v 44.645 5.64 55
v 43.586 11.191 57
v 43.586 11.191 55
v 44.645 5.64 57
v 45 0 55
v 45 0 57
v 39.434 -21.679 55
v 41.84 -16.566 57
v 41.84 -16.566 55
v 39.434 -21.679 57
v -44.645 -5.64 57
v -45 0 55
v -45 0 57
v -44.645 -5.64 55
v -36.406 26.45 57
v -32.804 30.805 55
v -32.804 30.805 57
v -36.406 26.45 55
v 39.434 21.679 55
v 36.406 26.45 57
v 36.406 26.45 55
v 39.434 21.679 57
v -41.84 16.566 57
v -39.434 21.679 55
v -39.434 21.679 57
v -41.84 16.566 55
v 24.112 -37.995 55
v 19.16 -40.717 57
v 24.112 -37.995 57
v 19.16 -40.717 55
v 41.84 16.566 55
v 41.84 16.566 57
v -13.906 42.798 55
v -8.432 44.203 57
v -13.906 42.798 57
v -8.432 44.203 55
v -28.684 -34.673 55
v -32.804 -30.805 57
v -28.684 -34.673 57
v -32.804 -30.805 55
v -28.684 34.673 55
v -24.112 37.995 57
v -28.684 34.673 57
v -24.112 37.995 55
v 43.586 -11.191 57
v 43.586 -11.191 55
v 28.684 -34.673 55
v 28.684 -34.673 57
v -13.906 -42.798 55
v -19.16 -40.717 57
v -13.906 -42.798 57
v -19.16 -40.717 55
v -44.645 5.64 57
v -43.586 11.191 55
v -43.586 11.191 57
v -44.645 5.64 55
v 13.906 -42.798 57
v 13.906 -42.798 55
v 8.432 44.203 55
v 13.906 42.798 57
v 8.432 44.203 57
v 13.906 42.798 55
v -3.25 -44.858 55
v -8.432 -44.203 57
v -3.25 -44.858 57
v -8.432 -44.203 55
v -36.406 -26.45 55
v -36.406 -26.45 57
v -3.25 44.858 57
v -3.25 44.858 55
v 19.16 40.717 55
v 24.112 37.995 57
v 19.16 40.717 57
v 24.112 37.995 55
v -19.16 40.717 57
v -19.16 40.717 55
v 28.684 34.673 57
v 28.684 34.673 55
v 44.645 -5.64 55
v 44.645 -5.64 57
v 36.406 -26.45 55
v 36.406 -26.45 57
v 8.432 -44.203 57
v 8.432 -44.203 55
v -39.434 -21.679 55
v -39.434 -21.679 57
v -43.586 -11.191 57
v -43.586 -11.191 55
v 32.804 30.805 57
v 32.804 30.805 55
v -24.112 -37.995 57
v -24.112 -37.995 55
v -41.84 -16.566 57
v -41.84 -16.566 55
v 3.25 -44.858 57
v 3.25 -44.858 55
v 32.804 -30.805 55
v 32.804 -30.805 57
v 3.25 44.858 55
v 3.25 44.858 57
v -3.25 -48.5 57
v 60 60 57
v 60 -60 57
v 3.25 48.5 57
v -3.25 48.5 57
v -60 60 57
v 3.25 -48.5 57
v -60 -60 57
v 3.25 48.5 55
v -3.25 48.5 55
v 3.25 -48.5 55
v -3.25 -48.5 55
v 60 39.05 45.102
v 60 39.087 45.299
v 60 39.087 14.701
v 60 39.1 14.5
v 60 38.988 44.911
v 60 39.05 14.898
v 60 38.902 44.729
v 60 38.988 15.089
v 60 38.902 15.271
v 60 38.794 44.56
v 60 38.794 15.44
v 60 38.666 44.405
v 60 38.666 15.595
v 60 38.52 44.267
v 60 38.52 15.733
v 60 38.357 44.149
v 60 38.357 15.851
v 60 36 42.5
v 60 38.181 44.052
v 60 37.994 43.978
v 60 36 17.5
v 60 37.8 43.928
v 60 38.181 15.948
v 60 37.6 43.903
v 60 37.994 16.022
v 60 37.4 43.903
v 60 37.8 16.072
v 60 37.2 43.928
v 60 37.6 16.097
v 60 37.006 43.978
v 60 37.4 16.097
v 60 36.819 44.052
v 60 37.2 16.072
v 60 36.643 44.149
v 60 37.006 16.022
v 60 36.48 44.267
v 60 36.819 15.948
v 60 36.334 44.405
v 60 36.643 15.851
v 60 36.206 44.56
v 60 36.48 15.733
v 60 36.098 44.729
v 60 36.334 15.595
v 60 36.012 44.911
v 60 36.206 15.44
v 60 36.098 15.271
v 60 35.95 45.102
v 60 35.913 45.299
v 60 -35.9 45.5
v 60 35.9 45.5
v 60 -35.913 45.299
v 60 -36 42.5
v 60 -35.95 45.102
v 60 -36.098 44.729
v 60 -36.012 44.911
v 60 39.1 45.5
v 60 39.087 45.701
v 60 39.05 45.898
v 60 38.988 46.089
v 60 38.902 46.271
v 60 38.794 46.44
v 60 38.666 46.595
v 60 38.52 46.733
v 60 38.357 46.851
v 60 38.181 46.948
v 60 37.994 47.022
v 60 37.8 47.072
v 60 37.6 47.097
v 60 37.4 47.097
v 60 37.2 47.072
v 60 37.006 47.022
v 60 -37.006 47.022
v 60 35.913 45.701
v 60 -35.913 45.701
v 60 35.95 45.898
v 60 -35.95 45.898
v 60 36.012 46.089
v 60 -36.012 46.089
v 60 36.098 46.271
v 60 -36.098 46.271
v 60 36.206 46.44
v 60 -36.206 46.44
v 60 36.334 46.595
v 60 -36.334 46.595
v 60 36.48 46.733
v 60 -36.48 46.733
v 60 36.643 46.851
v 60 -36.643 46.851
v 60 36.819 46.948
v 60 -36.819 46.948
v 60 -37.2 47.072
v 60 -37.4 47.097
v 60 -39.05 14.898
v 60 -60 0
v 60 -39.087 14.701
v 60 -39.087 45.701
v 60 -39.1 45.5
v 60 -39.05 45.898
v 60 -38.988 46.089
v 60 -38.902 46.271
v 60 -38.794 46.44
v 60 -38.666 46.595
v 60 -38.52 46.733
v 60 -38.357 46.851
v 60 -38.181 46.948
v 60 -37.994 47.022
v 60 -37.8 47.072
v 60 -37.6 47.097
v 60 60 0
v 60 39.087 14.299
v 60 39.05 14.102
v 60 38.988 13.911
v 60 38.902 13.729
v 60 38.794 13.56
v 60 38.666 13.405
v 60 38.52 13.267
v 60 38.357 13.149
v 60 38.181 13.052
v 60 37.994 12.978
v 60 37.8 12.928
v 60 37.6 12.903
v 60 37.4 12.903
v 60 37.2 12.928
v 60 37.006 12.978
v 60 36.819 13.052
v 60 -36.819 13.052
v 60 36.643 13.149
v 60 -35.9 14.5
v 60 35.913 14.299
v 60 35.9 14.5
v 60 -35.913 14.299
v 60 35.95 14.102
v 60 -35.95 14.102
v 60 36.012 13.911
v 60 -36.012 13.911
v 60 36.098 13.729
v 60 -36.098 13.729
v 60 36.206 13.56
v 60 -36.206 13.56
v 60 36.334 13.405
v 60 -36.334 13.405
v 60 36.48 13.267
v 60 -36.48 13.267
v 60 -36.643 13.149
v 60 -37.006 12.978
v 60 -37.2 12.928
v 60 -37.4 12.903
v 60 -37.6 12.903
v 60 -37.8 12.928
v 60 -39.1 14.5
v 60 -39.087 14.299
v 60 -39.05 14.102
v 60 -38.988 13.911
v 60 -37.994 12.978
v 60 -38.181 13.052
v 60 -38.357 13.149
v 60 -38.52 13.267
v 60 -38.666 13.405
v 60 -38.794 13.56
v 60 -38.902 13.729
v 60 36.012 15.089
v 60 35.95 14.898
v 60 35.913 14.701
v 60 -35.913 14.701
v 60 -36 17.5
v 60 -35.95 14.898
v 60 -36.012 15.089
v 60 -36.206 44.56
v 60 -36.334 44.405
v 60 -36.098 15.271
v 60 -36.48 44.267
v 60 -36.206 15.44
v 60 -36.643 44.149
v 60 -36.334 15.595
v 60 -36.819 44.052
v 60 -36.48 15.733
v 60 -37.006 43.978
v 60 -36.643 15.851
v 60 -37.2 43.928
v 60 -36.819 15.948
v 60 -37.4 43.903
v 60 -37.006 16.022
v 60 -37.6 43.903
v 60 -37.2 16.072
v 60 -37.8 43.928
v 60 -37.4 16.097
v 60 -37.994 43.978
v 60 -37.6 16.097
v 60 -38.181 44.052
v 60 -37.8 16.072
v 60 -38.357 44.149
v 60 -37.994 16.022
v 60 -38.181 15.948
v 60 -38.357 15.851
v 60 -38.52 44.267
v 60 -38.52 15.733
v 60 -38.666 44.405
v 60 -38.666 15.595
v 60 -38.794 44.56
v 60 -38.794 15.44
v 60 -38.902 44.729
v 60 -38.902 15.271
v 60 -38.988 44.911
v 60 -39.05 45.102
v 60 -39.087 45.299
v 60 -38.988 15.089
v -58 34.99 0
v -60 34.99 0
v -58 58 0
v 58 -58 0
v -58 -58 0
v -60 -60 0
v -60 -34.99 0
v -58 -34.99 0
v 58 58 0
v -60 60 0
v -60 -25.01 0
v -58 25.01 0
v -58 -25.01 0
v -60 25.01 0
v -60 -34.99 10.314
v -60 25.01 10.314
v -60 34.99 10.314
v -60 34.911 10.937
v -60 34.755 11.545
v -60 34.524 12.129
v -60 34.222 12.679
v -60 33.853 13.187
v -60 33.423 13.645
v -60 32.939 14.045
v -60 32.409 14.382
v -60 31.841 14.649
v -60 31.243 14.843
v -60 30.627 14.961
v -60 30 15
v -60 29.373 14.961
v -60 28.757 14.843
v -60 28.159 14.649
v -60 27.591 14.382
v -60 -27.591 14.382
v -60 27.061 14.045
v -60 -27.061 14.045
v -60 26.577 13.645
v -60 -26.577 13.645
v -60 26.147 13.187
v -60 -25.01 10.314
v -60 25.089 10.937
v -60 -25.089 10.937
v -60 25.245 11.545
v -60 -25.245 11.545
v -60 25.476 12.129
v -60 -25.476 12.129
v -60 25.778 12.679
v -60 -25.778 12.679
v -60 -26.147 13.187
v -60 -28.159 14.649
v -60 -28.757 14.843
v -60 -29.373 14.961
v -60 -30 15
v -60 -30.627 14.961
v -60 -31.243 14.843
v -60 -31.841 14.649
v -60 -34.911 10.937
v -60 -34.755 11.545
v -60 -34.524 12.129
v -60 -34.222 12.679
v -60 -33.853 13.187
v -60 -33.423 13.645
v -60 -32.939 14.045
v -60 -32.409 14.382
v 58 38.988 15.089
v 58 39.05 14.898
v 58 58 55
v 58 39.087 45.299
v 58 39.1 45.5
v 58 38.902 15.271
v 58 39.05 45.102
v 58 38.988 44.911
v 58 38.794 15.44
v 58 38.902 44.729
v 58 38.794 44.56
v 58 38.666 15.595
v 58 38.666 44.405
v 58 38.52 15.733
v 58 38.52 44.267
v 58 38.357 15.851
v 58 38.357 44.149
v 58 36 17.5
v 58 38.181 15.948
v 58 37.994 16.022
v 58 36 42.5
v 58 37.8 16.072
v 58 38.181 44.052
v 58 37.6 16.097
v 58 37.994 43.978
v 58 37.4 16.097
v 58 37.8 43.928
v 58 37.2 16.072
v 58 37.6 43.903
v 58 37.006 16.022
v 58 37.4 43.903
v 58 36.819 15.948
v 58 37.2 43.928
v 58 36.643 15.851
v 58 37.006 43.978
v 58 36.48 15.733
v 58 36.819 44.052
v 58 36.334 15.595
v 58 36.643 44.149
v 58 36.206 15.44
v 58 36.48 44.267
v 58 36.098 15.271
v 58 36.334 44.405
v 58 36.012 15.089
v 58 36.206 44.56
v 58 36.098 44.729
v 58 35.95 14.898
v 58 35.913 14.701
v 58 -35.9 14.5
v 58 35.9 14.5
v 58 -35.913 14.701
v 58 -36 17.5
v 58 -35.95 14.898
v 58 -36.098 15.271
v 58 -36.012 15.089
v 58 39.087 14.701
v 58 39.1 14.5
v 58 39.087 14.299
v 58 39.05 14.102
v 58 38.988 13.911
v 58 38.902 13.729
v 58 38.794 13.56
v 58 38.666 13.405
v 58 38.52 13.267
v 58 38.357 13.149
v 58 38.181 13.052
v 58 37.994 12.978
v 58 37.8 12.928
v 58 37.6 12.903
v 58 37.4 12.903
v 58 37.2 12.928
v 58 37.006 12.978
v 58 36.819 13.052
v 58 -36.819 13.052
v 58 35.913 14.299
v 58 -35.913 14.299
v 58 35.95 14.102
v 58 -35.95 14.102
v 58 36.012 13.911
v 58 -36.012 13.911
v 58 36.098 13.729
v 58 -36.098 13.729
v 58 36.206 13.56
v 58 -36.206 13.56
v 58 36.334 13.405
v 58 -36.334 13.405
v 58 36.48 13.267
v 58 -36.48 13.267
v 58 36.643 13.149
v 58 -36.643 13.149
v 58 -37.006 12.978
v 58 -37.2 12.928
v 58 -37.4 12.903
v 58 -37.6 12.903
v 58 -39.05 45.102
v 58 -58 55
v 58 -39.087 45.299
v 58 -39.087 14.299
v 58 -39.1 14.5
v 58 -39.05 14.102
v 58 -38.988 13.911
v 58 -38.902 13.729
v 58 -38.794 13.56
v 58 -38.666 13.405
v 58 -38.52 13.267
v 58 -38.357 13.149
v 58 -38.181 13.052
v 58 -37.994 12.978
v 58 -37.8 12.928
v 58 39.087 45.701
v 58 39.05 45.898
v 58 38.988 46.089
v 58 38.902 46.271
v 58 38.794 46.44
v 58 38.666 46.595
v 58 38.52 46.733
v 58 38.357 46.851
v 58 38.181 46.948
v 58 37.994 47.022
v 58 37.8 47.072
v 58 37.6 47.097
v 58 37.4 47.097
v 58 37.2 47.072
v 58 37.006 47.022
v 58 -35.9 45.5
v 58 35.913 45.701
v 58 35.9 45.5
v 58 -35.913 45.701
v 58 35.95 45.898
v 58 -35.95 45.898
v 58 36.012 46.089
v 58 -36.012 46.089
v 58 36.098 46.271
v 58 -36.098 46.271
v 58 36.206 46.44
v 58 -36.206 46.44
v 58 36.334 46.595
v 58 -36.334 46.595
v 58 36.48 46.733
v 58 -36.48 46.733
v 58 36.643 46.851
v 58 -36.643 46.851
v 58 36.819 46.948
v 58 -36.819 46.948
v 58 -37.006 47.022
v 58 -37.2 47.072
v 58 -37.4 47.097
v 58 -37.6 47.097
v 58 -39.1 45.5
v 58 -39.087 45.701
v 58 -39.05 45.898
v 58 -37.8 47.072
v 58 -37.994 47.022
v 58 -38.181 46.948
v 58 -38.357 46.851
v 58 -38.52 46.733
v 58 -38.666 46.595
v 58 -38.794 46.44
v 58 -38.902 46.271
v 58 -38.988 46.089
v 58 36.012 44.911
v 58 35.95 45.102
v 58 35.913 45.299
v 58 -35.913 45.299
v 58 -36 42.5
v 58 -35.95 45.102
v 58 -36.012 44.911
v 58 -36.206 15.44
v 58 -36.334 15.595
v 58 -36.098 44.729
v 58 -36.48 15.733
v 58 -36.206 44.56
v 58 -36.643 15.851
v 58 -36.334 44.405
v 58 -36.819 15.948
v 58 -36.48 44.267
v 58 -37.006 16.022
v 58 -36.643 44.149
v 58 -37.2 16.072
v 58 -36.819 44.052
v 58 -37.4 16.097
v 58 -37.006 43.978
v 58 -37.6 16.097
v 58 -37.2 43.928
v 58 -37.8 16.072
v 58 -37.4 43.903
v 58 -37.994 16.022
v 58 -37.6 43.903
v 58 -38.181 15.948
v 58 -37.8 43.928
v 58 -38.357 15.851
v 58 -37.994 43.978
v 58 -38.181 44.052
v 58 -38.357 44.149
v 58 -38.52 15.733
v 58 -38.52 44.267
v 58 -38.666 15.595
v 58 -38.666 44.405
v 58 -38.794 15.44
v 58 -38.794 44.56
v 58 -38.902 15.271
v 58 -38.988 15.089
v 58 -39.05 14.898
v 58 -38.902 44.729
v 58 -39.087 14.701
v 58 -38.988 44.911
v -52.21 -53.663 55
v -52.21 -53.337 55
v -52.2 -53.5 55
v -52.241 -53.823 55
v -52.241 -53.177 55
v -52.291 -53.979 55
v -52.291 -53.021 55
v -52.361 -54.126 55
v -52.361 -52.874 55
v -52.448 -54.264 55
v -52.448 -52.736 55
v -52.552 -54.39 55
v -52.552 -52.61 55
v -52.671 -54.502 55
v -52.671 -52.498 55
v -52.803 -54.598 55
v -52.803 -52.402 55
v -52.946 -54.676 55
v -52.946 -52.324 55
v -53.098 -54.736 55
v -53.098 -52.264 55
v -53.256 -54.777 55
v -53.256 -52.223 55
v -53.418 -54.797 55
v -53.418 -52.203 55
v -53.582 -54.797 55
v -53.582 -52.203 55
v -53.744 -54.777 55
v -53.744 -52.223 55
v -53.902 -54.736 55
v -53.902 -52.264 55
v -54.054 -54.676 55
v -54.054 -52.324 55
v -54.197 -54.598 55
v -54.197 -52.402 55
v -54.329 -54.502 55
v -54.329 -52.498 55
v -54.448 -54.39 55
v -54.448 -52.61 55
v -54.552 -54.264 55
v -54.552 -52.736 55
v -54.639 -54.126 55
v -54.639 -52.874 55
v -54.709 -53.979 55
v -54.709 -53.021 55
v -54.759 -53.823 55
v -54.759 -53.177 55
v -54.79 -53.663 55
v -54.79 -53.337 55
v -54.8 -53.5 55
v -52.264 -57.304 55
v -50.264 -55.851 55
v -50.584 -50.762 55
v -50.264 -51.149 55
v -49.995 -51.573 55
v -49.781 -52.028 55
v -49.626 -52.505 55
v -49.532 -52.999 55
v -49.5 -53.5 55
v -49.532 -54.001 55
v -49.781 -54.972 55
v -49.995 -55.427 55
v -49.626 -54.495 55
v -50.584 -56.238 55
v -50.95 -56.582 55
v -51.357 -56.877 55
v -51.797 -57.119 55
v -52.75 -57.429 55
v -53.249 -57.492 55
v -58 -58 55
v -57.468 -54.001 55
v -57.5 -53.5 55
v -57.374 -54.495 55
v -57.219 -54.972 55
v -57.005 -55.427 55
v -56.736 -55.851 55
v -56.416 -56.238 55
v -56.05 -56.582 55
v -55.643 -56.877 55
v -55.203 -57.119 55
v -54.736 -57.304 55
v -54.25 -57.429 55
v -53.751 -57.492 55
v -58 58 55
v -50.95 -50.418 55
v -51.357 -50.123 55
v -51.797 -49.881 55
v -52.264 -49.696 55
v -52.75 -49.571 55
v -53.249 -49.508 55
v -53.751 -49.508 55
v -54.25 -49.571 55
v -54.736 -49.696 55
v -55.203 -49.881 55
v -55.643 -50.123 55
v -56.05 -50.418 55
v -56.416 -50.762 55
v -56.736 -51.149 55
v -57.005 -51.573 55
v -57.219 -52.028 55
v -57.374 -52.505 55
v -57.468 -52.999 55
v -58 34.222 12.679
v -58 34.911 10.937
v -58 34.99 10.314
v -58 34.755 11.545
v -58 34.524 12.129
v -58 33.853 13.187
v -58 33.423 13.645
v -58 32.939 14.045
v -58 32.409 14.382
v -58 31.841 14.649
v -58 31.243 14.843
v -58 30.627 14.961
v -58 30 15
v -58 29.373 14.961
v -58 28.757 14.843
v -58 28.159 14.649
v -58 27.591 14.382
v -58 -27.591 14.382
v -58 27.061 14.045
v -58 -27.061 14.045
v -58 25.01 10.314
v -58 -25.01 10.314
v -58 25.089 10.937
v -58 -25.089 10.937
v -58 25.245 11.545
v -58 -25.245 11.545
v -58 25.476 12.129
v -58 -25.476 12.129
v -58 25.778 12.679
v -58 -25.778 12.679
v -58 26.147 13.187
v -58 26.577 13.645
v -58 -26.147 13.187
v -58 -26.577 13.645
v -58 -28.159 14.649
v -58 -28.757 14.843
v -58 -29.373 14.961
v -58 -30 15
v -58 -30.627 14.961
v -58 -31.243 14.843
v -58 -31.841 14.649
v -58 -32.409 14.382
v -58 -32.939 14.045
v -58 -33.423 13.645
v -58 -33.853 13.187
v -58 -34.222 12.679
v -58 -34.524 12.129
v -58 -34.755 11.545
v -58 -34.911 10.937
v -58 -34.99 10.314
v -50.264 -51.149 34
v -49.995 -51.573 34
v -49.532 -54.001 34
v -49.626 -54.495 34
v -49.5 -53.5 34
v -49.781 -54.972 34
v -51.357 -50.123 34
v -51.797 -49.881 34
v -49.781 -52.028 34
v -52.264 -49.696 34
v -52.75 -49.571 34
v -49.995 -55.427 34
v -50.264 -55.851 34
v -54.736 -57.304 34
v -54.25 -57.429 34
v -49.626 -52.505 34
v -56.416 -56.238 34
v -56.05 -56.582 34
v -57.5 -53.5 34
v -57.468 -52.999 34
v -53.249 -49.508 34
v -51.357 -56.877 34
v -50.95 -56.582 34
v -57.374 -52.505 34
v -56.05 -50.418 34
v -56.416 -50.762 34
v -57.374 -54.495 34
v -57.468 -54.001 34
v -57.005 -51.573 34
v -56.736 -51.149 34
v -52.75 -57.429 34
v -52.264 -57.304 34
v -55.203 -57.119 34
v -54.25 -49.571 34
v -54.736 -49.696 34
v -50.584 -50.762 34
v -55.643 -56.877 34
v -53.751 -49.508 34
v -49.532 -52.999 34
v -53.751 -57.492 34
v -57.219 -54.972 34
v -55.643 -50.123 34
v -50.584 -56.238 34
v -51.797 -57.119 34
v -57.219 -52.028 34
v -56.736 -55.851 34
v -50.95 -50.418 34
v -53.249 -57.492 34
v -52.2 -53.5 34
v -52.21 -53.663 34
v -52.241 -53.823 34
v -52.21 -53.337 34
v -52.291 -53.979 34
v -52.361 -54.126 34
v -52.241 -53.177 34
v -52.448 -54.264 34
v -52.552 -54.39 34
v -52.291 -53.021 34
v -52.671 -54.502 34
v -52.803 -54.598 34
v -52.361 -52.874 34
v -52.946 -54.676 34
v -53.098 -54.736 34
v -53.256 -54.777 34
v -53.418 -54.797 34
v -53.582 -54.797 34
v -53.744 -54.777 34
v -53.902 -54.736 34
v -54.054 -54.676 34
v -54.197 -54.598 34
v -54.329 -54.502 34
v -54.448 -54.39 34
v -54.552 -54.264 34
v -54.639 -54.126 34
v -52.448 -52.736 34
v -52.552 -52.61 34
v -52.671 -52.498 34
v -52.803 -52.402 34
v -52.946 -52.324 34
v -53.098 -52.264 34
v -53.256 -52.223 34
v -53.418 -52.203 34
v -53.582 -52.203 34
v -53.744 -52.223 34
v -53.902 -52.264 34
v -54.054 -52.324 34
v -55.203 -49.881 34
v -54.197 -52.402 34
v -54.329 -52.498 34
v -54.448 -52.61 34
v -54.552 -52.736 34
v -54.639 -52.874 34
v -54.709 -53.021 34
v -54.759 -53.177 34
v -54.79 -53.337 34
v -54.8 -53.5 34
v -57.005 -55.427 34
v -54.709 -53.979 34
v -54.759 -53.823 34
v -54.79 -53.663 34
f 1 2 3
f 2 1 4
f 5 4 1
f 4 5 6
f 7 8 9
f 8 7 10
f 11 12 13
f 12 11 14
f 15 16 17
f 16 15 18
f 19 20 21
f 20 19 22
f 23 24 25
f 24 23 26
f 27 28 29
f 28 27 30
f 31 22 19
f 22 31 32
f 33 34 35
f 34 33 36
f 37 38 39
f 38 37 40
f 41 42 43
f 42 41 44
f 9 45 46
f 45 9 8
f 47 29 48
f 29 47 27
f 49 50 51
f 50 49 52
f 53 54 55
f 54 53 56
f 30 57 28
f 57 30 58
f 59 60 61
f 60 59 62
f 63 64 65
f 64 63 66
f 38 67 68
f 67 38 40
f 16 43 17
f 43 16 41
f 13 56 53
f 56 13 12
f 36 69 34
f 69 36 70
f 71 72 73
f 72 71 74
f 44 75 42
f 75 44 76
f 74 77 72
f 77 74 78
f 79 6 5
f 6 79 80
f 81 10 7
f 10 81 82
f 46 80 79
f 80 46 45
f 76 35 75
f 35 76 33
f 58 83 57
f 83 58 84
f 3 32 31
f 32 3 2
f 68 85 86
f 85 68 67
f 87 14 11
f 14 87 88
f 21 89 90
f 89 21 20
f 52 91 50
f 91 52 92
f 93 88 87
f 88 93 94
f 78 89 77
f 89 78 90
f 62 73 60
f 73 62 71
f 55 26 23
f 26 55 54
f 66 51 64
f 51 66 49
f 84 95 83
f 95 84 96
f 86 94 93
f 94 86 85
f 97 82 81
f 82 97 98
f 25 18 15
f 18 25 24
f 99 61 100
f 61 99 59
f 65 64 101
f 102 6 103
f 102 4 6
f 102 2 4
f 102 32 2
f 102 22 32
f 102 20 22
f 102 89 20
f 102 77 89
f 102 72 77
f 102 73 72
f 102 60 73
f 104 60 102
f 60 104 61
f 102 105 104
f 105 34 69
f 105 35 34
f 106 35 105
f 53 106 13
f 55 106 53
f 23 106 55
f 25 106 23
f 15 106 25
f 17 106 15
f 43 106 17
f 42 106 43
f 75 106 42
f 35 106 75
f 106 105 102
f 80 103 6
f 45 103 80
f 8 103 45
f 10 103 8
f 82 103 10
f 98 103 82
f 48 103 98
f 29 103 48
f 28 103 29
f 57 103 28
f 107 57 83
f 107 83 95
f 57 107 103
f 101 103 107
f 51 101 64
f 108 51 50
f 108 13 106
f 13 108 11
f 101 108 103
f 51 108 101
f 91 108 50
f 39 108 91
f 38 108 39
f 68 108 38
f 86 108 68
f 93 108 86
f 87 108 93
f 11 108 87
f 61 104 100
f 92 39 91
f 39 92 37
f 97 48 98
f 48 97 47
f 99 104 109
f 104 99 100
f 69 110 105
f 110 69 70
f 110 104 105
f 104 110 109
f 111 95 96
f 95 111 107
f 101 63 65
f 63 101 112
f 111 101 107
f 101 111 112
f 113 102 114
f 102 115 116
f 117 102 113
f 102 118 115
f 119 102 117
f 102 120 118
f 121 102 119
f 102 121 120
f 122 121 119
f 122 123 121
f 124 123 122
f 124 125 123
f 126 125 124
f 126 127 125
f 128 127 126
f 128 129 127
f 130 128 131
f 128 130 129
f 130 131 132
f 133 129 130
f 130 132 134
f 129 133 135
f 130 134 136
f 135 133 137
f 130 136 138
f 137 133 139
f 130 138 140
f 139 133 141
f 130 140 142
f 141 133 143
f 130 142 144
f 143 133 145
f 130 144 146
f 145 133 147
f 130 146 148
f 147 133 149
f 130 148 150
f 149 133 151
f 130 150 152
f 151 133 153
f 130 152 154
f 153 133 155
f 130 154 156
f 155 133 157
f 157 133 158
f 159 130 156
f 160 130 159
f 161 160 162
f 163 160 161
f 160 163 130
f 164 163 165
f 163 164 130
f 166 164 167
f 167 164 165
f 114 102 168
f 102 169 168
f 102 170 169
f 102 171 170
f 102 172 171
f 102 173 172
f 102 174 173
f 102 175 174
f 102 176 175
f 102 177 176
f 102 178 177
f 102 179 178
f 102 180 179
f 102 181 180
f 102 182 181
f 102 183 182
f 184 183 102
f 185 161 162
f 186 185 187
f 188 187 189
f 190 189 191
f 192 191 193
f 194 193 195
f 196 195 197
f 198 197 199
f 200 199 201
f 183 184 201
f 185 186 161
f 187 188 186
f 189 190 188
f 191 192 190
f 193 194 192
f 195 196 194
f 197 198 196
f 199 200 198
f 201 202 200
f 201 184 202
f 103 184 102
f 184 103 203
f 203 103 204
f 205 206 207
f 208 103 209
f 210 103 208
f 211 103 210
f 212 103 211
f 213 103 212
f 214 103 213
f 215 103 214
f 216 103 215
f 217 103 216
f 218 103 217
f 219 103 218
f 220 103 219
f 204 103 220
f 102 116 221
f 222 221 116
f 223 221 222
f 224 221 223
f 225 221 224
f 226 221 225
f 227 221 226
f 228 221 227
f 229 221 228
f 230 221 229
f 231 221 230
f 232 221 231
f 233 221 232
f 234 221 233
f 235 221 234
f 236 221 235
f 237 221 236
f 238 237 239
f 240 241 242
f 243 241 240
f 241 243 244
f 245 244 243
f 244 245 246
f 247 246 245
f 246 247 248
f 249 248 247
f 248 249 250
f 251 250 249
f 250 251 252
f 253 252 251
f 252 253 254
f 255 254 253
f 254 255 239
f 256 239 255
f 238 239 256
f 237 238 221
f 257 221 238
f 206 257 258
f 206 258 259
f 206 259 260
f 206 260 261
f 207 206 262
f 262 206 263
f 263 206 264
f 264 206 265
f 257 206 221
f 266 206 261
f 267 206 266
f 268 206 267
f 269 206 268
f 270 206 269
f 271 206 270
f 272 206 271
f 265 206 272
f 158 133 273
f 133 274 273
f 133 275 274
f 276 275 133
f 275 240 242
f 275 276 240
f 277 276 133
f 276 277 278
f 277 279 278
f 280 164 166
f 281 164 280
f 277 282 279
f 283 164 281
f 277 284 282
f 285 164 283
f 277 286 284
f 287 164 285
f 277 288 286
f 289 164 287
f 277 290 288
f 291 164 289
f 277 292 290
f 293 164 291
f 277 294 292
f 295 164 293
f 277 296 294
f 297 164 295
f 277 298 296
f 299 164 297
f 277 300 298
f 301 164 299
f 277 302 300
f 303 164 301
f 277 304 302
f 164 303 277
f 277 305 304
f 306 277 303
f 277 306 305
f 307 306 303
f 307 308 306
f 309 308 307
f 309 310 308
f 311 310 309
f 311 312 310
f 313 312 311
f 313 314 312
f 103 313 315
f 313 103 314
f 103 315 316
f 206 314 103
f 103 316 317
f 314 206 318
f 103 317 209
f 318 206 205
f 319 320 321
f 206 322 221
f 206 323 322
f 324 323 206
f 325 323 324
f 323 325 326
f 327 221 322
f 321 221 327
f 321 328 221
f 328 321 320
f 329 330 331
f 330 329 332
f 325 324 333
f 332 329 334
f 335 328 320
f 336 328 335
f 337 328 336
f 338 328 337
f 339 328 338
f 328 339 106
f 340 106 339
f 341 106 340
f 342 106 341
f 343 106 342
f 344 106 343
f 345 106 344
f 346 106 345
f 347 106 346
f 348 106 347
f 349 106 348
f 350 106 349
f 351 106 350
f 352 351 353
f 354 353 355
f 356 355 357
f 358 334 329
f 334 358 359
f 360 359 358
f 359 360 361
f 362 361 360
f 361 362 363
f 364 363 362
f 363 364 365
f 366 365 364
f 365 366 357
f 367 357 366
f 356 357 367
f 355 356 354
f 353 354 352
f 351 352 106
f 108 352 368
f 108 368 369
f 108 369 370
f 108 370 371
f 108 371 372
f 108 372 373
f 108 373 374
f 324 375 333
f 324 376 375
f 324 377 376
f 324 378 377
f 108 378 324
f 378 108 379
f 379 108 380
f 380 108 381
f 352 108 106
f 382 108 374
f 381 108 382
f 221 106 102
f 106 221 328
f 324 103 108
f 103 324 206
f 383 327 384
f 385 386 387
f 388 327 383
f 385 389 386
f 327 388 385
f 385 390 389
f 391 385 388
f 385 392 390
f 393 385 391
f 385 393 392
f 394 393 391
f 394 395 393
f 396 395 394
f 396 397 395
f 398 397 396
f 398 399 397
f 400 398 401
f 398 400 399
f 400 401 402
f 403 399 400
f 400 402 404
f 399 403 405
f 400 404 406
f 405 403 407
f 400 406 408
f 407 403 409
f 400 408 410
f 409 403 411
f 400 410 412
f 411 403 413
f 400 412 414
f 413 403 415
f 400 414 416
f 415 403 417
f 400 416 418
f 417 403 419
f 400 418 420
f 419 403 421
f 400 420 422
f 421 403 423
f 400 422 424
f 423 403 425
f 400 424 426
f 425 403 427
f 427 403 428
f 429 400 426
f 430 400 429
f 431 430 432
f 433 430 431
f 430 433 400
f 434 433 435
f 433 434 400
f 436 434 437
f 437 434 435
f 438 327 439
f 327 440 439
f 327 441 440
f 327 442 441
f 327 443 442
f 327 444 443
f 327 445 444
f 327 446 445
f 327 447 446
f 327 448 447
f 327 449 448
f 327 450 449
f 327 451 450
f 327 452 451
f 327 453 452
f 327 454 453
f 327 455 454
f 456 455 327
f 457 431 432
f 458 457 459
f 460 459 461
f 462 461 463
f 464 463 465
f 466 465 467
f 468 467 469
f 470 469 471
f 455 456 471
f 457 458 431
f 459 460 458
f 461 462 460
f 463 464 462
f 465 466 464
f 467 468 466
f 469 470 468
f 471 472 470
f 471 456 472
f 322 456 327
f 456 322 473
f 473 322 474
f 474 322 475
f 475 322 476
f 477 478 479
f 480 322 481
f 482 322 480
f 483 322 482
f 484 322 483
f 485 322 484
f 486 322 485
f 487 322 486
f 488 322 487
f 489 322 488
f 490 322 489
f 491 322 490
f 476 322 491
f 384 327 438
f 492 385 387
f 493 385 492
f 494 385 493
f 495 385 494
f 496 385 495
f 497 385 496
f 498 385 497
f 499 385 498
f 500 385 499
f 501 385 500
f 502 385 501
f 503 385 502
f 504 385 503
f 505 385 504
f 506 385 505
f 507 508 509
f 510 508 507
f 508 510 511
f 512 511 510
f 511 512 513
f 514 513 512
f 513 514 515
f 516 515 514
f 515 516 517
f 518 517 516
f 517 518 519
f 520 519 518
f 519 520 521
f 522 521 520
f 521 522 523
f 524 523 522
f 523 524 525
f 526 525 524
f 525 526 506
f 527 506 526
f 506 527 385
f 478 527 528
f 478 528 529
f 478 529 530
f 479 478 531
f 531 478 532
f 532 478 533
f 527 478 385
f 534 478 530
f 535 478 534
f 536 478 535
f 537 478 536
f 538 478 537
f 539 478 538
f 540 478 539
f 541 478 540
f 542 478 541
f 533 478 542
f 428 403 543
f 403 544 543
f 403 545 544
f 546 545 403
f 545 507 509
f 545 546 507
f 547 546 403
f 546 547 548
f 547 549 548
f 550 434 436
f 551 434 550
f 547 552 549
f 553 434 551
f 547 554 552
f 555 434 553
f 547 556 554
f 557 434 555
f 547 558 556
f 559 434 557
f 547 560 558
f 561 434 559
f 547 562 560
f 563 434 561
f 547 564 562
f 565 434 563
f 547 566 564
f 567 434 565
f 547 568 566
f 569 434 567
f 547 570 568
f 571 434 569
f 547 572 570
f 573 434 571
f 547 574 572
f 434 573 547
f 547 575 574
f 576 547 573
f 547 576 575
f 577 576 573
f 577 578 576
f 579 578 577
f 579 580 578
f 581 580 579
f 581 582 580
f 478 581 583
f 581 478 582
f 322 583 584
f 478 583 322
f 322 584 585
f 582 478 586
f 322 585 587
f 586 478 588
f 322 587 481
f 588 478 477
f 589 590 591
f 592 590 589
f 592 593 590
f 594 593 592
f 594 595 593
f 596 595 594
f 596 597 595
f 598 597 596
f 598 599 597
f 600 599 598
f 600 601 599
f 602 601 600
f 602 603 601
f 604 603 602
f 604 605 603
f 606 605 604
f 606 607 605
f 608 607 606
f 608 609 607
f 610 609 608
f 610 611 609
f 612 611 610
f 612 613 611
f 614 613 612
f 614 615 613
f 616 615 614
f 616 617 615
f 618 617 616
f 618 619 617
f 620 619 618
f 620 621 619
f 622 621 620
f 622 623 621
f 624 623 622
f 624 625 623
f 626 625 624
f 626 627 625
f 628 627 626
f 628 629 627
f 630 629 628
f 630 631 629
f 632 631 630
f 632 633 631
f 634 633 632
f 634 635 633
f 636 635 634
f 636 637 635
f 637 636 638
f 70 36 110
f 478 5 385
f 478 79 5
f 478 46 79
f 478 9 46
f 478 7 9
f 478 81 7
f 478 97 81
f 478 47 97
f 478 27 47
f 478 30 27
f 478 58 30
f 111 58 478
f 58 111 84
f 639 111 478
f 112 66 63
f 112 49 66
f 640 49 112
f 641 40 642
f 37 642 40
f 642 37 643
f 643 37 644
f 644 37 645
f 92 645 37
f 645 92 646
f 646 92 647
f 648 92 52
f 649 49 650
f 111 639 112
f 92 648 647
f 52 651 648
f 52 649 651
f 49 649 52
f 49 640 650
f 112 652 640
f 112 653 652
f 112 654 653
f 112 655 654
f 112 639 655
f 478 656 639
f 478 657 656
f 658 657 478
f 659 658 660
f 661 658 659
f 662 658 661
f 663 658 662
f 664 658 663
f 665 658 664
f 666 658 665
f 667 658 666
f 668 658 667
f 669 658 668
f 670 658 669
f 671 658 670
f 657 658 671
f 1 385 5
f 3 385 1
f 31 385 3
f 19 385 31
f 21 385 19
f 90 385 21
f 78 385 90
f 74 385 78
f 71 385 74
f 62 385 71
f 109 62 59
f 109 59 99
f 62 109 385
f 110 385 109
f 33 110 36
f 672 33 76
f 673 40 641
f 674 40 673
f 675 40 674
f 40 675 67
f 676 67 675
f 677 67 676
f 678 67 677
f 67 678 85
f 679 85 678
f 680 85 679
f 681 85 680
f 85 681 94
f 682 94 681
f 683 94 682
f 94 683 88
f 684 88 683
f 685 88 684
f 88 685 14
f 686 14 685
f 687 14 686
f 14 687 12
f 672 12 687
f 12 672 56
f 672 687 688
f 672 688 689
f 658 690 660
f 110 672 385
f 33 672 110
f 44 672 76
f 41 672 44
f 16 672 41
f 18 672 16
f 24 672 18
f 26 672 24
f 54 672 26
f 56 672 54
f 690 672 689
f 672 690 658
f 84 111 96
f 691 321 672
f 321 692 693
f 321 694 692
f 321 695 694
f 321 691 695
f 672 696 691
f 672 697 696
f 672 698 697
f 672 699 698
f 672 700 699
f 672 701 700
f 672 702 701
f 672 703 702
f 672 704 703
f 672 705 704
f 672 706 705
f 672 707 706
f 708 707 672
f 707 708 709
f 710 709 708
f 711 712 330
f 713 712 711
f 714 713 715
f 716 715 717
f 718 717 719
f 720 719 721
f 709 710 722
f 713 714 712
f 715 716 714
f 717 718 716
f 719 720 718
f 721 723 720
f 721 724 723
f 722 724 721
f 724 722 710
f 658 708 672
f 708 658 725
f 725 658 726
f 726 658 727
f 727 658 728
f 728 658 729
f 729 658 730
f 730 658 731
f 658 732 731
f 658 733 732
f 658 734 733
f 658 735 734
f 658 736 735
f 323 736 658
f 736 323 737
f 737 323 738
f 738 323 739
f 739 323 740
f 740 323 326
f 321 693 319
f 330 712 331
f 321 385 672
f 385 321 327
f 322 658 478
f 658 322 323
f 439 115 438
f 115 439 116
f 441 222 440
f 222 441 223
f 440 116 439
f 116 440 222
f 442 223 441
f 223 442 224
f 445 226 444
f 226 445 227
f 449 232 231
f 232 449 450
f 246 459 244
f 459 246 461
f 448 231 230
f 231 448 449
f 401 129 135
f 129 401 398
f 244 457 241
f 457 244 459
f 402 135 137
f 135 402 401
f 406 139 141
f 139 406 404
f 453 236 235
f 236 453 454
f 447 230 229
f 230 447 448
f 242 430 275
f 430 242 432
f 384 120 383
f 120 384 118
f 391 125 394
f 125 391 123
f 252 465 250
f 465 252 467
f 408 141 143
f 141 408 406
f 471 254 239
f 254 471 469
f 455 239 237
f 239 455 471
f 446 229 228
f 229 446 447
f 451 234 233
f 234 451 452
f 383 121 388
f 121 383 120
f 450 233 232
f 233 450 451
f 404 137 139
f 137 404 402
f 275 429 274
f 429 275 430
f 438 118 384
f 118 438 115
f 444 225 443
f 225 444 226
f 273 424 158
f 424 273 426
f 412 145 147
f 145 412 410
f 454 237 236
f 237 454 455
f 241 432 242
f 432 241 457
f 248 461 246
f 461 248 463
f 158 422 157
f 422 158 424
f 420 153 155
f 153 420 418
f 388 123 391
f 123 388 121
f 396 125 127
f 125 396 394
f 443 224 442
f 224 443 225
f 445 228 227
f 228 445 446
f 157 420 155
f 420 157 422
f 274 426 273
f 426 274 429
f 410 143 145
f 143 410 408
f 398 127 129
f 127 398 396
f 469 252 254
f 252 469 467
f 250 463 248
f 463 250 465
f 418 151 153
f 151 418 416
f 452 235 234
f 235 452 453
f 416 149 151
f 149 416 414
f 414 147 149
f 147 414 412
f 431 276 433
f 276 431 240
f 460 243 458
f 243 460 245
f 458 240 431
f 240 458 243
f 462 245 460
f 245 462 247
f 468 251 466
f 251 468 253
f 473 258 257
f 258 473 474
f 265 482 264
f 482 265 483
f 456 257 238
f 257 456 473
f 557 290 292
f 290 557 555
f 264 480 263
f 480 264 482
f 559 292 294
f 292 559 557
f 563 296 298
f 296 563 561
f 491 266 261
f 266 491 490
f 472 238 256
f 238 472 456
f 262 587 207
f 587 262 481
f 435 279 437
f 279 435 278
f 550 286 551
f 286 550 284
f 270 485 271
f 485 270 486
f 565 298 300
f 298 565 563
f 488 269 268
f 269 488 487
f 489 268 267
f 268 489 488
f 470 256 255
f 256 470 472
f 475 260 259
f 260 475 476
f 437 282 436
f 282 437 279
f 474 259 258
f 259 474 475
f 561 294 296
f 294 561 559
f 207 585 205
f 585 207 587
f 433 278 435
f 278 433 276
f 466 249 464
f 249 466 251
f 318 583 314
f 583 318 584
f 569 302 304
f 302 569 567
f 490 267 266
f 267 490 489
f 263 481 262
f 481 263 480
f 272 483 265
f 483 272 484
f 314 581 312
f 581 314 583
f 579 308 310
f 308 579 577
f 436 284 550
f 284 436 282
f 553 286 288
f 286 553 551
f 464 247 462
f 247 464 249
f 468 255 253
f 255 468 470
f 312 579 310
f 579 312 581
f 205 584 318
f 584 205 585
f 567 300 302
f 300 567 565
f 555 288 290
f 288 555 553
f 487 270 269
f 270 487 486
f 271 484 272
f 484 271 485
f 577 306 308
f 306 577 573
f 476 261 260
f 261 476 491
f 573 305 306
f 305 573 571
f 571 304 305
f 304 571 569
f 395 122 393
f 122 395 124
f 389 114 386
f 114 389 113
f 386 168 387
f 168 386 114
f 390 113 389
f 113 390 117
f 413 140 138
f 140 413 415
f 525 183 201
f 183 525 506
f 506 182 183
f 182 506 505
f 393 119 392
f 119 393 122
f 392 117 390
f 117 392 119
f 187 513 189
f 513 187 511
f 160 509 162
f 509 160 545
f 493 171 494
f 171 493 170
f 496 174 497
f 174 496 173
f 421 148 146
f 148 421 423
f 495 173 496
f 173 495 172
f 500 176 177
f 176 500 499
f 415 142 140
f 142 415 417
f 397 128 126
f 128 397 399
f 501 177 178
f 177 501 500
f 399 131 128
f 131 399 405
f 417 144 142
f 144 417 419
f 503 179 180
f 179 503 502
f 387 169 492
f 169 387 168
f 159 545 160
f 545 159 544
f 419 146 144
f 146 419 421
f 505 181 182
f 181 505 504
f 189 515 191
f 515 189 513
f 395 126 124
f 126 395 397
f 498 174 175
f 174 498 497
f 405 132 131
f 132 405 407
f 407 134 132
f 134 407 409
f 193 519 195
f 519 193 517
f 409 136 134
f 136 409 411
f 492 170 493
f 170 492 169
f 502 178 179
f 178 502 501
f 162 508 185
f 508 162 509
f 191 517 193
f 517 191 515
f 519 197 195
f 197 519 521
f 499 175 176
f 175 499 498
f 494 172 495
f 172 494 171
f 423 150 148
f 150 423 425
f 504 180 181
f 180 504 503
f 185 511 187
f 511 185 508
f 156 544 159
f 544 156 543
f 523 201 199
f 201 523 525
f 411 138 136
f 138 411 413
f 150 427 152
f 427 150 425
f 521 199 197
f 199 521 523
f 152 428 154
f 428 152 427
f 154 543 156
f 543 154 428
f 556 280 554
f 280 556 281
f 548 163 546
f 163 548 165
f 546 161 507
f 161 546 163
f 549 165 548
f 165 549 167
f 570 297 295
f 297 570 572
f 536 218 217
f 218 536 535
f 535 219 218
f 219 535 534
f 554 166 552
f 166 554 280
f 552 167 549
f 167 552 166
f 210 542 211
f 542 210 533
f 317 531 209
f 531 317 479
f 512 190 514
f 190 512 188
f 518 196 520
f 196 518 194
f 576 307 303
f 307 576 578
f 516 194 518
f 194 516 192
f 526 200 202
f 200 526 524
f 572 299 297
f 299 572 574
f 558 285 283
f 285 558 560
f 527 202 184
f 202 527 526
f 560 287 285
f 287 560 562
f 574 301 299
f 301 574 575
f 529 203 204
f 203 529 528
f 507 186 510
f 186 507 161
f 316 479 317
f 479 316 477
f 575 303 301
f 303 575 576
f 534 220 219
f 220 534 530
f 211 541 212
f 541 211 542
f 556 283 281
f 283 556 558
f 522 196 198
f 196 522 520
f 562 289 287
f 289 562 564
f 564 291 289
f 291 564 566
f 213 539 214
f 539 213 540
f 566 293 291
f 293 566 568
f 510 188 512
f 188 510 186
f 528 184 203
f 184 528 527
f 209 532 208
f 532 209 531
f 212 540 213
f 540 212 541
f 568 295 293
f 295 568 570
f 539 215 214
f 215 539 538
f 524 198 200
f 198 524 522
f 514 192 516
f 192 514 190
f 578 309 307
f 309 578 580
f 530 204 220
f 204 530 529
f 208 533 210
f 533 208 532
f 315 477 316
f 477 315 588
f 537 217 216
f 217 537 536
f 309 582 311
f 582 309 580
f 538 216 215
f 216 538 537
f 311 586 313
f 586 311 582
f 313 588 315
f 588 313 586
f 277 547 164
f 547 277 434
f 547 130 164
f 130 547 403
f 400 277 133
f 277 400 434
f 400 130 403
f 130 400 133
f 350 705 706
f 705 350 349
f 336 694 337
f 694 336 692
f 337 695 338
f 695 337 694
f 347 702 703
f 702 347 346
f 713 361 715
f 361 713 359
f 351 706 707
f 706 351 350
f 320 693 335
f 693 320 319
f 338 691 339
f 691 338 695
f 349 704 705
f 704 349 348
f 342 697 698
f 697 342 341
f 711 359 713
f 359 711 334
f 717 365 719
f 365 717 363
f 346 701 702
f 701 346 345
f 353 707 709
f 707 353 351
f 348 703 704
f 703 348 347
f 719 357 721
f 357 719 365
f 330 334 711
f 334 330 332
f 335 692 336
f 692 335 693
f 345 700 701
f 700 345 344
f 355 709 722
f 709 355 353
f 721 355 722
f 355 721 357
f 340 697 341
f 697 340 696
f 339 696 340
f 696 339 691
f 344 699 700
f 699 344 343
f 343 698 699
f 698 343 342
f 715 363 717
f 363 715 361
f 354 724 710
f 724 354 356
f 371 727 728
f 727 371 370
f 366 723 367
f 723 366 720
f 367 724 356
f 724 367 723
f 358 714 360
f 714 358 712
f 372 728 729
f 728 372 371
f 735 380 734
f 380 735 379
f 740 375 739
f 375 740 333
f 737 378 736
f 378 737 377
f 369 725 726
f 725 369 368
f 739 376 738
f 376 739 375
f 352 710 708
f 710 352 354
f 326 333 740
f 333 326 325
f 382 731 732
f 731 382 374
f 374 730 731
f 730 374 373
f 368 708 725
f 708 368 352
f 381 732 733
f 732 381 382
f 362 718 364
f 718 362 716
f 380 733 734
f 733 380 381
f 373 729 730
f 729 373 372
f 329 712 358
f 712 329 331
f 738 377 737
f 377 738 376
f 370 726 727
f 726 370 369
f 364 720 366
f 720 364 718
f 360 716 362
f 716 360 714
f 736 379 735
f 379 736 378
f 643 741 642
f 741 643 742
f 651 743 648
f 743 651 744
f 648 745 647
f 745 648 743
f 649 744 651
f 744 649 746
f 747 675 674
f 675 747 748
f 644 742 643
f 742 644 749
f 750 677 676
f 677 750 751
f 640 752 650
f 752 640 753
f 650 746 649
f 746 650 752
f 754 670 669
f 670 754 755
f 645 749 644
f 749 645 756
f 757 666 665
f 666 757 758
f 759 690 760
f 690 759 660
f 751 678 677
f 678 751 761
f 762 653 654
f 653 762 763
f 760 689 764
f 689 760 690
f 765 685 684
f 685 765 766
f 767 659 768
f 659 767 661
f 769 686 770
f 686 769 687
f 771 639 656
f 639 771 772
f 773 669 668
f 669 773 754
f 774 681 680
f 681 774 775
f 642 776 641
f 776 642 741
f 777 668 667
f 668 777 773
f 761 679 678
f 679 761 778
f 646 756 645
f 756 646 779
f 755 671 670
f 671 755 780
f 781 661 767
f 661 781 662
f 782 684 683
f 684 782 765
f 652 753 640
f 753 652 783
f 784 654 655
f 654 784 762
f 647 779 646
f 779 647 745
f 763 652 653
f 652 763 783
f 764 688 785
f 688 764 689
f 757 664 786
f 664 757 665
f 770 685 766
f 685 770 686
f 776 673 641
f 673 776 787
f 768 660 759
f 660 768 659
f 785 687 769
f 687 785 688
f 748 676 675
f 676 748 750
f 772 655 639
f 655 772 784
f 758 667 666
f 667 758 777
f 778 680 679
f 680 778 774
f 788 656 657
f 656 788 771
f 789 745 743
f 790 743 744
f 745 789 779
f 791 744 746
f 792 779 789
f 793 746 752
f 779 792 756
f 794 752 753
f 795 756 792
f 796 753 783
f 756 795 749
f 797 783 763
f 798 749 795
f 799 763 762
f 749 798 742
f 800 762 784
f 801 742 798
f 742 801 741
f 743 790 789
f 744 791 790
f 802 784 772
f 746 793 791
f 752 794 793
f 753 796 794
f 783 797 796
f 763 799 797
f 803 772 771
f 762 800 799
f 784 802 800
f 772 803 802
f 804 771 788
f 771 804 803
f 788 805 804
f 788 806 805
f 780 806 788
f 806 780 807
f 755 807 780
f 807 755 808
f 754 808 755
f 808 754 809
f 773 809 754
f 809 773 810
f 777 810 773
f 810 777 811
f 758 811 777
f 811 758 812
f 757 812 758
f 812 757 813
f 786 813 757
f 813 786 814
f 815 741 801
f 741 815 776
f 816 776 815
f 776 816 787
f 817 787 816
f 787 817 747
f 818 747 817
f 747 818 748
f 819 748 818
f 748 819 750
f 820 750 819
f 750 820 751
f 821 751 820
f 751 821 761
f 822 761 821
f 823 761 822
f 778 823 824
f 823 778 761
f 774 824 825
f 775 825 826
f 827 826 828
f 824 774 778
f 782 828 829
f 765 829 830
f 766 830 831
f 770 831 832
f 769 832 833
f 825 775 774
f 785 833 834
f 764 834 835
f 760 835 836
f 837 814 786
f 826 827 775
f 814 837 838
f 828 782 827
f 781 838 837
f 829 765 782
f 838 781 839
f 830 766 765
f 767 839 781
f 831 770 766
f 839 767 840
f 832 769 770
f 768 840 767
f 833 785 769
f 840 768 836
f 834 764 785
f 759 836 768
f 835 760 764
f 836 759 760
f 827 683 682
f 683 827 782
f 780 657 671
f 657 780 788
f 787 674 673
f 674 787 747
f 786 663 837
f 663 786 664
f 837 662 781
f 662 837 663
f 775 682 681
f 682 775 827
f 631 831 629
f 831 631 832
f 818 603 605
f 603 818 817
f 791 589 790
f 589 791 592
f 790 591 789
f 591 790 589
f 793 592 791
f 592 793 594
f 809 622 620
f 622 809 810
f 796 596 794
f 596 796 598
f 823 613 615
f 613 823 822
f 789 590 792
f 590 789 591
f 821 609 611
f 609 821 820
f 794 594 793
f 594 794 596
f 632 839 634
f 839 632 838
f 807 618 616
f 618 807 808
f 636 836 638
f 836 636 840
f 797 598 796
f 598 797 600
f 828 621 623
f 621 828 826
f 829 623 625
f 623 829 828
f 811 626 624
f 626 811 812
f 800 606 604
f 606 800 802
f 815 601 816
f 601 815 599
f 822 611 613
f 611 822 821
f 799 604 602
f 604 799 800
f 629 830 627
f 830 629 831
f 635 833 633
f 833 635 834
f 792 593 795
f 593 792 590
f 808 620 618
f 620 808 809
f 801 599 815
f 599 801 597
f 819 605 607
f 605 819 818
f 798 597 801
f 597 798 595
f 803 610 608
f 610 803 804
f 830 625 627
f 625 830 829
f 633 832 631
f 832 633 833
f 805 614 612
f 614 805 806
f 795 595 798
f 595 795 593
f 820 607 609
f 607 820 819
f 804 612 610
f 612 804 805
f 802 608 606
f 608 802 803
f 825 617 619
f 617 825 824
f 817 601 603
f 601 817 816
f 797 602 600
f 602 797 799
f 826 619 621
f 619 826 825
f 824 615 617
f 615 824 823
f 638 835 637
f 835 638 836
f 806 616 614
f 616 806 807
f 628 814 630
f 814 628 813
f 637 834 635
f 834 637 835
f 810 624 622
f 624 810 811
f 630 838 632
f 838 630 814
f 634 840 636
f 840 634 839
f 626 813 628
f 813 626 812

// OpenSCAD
$fn=50;
module main(){
difference(){
    h = 57;
translate([0,0,h/2])cube([120,120,h],center=true);
translate([0,0,h/2-2])cube([120-4,120-4,h],center=true);
translate([0,0,h-3])
union(){
cylinder(r=45,h=3);
translate([0,44+4/2,3/2])cube([6.5,4+1,3],center=true);
translate([0,-(44+4/2),3/2])cube([6.5,4+1,3],center=true);
}
}
}

module lcdMonitor(){
    translate([0,0,3/2])cube([72,25,3+10],center=true);
}

module lcdLegs(){
    translate([(40-5/2),(18-5/2),0])
    union(){
        cylinder(r=1.25,h=8);
//        rotate([0,0,45])cylinder(r1=9/2,r2=5/2,h=8-1.5,$fn=50);
    }
    translate([-(40-5/2),(18-5/2),0])union(){
        cylinder(r=1.25,h=8);
//        rotate([0,0,45])cylinder(r1=9/2,r2=5/2,h=8-1.5,$fn=50);
    }
    translate([(40-5/2),-(18-5/2),0])union(){
        cylinder(r=1.25,h=8);
//        rotate([0,0,45])cylinder(r1=9/2,r2=5/2,h=8-1.5,$fn=50);
    }
    translate([-(40-5/2),-(18-5/2),0])union(){
        cylinder(r=1.25,h=8);
//        rotate([0,0,45])cylinder(r1=9/2,r2=5/2,h=8-1.5,$fn=50);
    }
}

module lcdLegs_whole(){
    translate([(40-5/2),(18-5/2),-1])
    union(){
        cylinder(r=1.6,h=8);
    }
    translate([-(40-5/2),(18-5/2),-1])union(){
        cylinder(r=1.6,h=8);
    }
    translate([(40-5/2),-(18-5/2),-1])union(){
        cylinder(r=1.6,h=8);
    }
    translate([-(40-5/2),-(18-5/2),-1])union(){
        cylinder(r=1.6,h=8);
    }
}

module support(){
    translate([0,0,3/2])cube([72-1,25-1,0.3],center=true);
}

//support();

difference(){
    union(){
        main();
//        translate([120/2,0,30])
//            rotate([-90,0,90])
//                lcdLegs();
    }//union
    translate([120/2,0,30])
        rotate([-90,0,90])
            lcdLegs_whole();
    translate([120/2,0,30])rotate([-90,0,90])lcdMonitor();
    hull(){
        translate([-120/2,30,0])
            rotate([0,90,0])
                cylinder(r=5,h=5);
        translate([-120/2,30,10])
            rotate([0,90,0])
                cylinder(r=5,h=5);    
    }//hull
    hull(){
        translate([-120/2,-30,0])
            rotate([0,90,0])
                cylinder(r=5,h=5);
        translate([-120/2,-30,10])
            rotate([0,90,0])
                cylinder(r=5,h=5);    
    }//hull
}//differeice


module lcdLegs_test()
translate([120/2,0,0])union(){
    translate([0,0,2/2])
    cube([30,100,2],center=true);
    translate([0,0,65/2])
    cube([2,100,65],center=true);
}
//lcdLegs_test();

module pcbleg(){
    difference(){
    cylinder(r=4, h=21);
    cylinder(r=1.3, h=23);
    }
}

translate([-(60-2-4.5),-(60-2-4.5),57-2])rotate([180,0,0])pcbleg();
